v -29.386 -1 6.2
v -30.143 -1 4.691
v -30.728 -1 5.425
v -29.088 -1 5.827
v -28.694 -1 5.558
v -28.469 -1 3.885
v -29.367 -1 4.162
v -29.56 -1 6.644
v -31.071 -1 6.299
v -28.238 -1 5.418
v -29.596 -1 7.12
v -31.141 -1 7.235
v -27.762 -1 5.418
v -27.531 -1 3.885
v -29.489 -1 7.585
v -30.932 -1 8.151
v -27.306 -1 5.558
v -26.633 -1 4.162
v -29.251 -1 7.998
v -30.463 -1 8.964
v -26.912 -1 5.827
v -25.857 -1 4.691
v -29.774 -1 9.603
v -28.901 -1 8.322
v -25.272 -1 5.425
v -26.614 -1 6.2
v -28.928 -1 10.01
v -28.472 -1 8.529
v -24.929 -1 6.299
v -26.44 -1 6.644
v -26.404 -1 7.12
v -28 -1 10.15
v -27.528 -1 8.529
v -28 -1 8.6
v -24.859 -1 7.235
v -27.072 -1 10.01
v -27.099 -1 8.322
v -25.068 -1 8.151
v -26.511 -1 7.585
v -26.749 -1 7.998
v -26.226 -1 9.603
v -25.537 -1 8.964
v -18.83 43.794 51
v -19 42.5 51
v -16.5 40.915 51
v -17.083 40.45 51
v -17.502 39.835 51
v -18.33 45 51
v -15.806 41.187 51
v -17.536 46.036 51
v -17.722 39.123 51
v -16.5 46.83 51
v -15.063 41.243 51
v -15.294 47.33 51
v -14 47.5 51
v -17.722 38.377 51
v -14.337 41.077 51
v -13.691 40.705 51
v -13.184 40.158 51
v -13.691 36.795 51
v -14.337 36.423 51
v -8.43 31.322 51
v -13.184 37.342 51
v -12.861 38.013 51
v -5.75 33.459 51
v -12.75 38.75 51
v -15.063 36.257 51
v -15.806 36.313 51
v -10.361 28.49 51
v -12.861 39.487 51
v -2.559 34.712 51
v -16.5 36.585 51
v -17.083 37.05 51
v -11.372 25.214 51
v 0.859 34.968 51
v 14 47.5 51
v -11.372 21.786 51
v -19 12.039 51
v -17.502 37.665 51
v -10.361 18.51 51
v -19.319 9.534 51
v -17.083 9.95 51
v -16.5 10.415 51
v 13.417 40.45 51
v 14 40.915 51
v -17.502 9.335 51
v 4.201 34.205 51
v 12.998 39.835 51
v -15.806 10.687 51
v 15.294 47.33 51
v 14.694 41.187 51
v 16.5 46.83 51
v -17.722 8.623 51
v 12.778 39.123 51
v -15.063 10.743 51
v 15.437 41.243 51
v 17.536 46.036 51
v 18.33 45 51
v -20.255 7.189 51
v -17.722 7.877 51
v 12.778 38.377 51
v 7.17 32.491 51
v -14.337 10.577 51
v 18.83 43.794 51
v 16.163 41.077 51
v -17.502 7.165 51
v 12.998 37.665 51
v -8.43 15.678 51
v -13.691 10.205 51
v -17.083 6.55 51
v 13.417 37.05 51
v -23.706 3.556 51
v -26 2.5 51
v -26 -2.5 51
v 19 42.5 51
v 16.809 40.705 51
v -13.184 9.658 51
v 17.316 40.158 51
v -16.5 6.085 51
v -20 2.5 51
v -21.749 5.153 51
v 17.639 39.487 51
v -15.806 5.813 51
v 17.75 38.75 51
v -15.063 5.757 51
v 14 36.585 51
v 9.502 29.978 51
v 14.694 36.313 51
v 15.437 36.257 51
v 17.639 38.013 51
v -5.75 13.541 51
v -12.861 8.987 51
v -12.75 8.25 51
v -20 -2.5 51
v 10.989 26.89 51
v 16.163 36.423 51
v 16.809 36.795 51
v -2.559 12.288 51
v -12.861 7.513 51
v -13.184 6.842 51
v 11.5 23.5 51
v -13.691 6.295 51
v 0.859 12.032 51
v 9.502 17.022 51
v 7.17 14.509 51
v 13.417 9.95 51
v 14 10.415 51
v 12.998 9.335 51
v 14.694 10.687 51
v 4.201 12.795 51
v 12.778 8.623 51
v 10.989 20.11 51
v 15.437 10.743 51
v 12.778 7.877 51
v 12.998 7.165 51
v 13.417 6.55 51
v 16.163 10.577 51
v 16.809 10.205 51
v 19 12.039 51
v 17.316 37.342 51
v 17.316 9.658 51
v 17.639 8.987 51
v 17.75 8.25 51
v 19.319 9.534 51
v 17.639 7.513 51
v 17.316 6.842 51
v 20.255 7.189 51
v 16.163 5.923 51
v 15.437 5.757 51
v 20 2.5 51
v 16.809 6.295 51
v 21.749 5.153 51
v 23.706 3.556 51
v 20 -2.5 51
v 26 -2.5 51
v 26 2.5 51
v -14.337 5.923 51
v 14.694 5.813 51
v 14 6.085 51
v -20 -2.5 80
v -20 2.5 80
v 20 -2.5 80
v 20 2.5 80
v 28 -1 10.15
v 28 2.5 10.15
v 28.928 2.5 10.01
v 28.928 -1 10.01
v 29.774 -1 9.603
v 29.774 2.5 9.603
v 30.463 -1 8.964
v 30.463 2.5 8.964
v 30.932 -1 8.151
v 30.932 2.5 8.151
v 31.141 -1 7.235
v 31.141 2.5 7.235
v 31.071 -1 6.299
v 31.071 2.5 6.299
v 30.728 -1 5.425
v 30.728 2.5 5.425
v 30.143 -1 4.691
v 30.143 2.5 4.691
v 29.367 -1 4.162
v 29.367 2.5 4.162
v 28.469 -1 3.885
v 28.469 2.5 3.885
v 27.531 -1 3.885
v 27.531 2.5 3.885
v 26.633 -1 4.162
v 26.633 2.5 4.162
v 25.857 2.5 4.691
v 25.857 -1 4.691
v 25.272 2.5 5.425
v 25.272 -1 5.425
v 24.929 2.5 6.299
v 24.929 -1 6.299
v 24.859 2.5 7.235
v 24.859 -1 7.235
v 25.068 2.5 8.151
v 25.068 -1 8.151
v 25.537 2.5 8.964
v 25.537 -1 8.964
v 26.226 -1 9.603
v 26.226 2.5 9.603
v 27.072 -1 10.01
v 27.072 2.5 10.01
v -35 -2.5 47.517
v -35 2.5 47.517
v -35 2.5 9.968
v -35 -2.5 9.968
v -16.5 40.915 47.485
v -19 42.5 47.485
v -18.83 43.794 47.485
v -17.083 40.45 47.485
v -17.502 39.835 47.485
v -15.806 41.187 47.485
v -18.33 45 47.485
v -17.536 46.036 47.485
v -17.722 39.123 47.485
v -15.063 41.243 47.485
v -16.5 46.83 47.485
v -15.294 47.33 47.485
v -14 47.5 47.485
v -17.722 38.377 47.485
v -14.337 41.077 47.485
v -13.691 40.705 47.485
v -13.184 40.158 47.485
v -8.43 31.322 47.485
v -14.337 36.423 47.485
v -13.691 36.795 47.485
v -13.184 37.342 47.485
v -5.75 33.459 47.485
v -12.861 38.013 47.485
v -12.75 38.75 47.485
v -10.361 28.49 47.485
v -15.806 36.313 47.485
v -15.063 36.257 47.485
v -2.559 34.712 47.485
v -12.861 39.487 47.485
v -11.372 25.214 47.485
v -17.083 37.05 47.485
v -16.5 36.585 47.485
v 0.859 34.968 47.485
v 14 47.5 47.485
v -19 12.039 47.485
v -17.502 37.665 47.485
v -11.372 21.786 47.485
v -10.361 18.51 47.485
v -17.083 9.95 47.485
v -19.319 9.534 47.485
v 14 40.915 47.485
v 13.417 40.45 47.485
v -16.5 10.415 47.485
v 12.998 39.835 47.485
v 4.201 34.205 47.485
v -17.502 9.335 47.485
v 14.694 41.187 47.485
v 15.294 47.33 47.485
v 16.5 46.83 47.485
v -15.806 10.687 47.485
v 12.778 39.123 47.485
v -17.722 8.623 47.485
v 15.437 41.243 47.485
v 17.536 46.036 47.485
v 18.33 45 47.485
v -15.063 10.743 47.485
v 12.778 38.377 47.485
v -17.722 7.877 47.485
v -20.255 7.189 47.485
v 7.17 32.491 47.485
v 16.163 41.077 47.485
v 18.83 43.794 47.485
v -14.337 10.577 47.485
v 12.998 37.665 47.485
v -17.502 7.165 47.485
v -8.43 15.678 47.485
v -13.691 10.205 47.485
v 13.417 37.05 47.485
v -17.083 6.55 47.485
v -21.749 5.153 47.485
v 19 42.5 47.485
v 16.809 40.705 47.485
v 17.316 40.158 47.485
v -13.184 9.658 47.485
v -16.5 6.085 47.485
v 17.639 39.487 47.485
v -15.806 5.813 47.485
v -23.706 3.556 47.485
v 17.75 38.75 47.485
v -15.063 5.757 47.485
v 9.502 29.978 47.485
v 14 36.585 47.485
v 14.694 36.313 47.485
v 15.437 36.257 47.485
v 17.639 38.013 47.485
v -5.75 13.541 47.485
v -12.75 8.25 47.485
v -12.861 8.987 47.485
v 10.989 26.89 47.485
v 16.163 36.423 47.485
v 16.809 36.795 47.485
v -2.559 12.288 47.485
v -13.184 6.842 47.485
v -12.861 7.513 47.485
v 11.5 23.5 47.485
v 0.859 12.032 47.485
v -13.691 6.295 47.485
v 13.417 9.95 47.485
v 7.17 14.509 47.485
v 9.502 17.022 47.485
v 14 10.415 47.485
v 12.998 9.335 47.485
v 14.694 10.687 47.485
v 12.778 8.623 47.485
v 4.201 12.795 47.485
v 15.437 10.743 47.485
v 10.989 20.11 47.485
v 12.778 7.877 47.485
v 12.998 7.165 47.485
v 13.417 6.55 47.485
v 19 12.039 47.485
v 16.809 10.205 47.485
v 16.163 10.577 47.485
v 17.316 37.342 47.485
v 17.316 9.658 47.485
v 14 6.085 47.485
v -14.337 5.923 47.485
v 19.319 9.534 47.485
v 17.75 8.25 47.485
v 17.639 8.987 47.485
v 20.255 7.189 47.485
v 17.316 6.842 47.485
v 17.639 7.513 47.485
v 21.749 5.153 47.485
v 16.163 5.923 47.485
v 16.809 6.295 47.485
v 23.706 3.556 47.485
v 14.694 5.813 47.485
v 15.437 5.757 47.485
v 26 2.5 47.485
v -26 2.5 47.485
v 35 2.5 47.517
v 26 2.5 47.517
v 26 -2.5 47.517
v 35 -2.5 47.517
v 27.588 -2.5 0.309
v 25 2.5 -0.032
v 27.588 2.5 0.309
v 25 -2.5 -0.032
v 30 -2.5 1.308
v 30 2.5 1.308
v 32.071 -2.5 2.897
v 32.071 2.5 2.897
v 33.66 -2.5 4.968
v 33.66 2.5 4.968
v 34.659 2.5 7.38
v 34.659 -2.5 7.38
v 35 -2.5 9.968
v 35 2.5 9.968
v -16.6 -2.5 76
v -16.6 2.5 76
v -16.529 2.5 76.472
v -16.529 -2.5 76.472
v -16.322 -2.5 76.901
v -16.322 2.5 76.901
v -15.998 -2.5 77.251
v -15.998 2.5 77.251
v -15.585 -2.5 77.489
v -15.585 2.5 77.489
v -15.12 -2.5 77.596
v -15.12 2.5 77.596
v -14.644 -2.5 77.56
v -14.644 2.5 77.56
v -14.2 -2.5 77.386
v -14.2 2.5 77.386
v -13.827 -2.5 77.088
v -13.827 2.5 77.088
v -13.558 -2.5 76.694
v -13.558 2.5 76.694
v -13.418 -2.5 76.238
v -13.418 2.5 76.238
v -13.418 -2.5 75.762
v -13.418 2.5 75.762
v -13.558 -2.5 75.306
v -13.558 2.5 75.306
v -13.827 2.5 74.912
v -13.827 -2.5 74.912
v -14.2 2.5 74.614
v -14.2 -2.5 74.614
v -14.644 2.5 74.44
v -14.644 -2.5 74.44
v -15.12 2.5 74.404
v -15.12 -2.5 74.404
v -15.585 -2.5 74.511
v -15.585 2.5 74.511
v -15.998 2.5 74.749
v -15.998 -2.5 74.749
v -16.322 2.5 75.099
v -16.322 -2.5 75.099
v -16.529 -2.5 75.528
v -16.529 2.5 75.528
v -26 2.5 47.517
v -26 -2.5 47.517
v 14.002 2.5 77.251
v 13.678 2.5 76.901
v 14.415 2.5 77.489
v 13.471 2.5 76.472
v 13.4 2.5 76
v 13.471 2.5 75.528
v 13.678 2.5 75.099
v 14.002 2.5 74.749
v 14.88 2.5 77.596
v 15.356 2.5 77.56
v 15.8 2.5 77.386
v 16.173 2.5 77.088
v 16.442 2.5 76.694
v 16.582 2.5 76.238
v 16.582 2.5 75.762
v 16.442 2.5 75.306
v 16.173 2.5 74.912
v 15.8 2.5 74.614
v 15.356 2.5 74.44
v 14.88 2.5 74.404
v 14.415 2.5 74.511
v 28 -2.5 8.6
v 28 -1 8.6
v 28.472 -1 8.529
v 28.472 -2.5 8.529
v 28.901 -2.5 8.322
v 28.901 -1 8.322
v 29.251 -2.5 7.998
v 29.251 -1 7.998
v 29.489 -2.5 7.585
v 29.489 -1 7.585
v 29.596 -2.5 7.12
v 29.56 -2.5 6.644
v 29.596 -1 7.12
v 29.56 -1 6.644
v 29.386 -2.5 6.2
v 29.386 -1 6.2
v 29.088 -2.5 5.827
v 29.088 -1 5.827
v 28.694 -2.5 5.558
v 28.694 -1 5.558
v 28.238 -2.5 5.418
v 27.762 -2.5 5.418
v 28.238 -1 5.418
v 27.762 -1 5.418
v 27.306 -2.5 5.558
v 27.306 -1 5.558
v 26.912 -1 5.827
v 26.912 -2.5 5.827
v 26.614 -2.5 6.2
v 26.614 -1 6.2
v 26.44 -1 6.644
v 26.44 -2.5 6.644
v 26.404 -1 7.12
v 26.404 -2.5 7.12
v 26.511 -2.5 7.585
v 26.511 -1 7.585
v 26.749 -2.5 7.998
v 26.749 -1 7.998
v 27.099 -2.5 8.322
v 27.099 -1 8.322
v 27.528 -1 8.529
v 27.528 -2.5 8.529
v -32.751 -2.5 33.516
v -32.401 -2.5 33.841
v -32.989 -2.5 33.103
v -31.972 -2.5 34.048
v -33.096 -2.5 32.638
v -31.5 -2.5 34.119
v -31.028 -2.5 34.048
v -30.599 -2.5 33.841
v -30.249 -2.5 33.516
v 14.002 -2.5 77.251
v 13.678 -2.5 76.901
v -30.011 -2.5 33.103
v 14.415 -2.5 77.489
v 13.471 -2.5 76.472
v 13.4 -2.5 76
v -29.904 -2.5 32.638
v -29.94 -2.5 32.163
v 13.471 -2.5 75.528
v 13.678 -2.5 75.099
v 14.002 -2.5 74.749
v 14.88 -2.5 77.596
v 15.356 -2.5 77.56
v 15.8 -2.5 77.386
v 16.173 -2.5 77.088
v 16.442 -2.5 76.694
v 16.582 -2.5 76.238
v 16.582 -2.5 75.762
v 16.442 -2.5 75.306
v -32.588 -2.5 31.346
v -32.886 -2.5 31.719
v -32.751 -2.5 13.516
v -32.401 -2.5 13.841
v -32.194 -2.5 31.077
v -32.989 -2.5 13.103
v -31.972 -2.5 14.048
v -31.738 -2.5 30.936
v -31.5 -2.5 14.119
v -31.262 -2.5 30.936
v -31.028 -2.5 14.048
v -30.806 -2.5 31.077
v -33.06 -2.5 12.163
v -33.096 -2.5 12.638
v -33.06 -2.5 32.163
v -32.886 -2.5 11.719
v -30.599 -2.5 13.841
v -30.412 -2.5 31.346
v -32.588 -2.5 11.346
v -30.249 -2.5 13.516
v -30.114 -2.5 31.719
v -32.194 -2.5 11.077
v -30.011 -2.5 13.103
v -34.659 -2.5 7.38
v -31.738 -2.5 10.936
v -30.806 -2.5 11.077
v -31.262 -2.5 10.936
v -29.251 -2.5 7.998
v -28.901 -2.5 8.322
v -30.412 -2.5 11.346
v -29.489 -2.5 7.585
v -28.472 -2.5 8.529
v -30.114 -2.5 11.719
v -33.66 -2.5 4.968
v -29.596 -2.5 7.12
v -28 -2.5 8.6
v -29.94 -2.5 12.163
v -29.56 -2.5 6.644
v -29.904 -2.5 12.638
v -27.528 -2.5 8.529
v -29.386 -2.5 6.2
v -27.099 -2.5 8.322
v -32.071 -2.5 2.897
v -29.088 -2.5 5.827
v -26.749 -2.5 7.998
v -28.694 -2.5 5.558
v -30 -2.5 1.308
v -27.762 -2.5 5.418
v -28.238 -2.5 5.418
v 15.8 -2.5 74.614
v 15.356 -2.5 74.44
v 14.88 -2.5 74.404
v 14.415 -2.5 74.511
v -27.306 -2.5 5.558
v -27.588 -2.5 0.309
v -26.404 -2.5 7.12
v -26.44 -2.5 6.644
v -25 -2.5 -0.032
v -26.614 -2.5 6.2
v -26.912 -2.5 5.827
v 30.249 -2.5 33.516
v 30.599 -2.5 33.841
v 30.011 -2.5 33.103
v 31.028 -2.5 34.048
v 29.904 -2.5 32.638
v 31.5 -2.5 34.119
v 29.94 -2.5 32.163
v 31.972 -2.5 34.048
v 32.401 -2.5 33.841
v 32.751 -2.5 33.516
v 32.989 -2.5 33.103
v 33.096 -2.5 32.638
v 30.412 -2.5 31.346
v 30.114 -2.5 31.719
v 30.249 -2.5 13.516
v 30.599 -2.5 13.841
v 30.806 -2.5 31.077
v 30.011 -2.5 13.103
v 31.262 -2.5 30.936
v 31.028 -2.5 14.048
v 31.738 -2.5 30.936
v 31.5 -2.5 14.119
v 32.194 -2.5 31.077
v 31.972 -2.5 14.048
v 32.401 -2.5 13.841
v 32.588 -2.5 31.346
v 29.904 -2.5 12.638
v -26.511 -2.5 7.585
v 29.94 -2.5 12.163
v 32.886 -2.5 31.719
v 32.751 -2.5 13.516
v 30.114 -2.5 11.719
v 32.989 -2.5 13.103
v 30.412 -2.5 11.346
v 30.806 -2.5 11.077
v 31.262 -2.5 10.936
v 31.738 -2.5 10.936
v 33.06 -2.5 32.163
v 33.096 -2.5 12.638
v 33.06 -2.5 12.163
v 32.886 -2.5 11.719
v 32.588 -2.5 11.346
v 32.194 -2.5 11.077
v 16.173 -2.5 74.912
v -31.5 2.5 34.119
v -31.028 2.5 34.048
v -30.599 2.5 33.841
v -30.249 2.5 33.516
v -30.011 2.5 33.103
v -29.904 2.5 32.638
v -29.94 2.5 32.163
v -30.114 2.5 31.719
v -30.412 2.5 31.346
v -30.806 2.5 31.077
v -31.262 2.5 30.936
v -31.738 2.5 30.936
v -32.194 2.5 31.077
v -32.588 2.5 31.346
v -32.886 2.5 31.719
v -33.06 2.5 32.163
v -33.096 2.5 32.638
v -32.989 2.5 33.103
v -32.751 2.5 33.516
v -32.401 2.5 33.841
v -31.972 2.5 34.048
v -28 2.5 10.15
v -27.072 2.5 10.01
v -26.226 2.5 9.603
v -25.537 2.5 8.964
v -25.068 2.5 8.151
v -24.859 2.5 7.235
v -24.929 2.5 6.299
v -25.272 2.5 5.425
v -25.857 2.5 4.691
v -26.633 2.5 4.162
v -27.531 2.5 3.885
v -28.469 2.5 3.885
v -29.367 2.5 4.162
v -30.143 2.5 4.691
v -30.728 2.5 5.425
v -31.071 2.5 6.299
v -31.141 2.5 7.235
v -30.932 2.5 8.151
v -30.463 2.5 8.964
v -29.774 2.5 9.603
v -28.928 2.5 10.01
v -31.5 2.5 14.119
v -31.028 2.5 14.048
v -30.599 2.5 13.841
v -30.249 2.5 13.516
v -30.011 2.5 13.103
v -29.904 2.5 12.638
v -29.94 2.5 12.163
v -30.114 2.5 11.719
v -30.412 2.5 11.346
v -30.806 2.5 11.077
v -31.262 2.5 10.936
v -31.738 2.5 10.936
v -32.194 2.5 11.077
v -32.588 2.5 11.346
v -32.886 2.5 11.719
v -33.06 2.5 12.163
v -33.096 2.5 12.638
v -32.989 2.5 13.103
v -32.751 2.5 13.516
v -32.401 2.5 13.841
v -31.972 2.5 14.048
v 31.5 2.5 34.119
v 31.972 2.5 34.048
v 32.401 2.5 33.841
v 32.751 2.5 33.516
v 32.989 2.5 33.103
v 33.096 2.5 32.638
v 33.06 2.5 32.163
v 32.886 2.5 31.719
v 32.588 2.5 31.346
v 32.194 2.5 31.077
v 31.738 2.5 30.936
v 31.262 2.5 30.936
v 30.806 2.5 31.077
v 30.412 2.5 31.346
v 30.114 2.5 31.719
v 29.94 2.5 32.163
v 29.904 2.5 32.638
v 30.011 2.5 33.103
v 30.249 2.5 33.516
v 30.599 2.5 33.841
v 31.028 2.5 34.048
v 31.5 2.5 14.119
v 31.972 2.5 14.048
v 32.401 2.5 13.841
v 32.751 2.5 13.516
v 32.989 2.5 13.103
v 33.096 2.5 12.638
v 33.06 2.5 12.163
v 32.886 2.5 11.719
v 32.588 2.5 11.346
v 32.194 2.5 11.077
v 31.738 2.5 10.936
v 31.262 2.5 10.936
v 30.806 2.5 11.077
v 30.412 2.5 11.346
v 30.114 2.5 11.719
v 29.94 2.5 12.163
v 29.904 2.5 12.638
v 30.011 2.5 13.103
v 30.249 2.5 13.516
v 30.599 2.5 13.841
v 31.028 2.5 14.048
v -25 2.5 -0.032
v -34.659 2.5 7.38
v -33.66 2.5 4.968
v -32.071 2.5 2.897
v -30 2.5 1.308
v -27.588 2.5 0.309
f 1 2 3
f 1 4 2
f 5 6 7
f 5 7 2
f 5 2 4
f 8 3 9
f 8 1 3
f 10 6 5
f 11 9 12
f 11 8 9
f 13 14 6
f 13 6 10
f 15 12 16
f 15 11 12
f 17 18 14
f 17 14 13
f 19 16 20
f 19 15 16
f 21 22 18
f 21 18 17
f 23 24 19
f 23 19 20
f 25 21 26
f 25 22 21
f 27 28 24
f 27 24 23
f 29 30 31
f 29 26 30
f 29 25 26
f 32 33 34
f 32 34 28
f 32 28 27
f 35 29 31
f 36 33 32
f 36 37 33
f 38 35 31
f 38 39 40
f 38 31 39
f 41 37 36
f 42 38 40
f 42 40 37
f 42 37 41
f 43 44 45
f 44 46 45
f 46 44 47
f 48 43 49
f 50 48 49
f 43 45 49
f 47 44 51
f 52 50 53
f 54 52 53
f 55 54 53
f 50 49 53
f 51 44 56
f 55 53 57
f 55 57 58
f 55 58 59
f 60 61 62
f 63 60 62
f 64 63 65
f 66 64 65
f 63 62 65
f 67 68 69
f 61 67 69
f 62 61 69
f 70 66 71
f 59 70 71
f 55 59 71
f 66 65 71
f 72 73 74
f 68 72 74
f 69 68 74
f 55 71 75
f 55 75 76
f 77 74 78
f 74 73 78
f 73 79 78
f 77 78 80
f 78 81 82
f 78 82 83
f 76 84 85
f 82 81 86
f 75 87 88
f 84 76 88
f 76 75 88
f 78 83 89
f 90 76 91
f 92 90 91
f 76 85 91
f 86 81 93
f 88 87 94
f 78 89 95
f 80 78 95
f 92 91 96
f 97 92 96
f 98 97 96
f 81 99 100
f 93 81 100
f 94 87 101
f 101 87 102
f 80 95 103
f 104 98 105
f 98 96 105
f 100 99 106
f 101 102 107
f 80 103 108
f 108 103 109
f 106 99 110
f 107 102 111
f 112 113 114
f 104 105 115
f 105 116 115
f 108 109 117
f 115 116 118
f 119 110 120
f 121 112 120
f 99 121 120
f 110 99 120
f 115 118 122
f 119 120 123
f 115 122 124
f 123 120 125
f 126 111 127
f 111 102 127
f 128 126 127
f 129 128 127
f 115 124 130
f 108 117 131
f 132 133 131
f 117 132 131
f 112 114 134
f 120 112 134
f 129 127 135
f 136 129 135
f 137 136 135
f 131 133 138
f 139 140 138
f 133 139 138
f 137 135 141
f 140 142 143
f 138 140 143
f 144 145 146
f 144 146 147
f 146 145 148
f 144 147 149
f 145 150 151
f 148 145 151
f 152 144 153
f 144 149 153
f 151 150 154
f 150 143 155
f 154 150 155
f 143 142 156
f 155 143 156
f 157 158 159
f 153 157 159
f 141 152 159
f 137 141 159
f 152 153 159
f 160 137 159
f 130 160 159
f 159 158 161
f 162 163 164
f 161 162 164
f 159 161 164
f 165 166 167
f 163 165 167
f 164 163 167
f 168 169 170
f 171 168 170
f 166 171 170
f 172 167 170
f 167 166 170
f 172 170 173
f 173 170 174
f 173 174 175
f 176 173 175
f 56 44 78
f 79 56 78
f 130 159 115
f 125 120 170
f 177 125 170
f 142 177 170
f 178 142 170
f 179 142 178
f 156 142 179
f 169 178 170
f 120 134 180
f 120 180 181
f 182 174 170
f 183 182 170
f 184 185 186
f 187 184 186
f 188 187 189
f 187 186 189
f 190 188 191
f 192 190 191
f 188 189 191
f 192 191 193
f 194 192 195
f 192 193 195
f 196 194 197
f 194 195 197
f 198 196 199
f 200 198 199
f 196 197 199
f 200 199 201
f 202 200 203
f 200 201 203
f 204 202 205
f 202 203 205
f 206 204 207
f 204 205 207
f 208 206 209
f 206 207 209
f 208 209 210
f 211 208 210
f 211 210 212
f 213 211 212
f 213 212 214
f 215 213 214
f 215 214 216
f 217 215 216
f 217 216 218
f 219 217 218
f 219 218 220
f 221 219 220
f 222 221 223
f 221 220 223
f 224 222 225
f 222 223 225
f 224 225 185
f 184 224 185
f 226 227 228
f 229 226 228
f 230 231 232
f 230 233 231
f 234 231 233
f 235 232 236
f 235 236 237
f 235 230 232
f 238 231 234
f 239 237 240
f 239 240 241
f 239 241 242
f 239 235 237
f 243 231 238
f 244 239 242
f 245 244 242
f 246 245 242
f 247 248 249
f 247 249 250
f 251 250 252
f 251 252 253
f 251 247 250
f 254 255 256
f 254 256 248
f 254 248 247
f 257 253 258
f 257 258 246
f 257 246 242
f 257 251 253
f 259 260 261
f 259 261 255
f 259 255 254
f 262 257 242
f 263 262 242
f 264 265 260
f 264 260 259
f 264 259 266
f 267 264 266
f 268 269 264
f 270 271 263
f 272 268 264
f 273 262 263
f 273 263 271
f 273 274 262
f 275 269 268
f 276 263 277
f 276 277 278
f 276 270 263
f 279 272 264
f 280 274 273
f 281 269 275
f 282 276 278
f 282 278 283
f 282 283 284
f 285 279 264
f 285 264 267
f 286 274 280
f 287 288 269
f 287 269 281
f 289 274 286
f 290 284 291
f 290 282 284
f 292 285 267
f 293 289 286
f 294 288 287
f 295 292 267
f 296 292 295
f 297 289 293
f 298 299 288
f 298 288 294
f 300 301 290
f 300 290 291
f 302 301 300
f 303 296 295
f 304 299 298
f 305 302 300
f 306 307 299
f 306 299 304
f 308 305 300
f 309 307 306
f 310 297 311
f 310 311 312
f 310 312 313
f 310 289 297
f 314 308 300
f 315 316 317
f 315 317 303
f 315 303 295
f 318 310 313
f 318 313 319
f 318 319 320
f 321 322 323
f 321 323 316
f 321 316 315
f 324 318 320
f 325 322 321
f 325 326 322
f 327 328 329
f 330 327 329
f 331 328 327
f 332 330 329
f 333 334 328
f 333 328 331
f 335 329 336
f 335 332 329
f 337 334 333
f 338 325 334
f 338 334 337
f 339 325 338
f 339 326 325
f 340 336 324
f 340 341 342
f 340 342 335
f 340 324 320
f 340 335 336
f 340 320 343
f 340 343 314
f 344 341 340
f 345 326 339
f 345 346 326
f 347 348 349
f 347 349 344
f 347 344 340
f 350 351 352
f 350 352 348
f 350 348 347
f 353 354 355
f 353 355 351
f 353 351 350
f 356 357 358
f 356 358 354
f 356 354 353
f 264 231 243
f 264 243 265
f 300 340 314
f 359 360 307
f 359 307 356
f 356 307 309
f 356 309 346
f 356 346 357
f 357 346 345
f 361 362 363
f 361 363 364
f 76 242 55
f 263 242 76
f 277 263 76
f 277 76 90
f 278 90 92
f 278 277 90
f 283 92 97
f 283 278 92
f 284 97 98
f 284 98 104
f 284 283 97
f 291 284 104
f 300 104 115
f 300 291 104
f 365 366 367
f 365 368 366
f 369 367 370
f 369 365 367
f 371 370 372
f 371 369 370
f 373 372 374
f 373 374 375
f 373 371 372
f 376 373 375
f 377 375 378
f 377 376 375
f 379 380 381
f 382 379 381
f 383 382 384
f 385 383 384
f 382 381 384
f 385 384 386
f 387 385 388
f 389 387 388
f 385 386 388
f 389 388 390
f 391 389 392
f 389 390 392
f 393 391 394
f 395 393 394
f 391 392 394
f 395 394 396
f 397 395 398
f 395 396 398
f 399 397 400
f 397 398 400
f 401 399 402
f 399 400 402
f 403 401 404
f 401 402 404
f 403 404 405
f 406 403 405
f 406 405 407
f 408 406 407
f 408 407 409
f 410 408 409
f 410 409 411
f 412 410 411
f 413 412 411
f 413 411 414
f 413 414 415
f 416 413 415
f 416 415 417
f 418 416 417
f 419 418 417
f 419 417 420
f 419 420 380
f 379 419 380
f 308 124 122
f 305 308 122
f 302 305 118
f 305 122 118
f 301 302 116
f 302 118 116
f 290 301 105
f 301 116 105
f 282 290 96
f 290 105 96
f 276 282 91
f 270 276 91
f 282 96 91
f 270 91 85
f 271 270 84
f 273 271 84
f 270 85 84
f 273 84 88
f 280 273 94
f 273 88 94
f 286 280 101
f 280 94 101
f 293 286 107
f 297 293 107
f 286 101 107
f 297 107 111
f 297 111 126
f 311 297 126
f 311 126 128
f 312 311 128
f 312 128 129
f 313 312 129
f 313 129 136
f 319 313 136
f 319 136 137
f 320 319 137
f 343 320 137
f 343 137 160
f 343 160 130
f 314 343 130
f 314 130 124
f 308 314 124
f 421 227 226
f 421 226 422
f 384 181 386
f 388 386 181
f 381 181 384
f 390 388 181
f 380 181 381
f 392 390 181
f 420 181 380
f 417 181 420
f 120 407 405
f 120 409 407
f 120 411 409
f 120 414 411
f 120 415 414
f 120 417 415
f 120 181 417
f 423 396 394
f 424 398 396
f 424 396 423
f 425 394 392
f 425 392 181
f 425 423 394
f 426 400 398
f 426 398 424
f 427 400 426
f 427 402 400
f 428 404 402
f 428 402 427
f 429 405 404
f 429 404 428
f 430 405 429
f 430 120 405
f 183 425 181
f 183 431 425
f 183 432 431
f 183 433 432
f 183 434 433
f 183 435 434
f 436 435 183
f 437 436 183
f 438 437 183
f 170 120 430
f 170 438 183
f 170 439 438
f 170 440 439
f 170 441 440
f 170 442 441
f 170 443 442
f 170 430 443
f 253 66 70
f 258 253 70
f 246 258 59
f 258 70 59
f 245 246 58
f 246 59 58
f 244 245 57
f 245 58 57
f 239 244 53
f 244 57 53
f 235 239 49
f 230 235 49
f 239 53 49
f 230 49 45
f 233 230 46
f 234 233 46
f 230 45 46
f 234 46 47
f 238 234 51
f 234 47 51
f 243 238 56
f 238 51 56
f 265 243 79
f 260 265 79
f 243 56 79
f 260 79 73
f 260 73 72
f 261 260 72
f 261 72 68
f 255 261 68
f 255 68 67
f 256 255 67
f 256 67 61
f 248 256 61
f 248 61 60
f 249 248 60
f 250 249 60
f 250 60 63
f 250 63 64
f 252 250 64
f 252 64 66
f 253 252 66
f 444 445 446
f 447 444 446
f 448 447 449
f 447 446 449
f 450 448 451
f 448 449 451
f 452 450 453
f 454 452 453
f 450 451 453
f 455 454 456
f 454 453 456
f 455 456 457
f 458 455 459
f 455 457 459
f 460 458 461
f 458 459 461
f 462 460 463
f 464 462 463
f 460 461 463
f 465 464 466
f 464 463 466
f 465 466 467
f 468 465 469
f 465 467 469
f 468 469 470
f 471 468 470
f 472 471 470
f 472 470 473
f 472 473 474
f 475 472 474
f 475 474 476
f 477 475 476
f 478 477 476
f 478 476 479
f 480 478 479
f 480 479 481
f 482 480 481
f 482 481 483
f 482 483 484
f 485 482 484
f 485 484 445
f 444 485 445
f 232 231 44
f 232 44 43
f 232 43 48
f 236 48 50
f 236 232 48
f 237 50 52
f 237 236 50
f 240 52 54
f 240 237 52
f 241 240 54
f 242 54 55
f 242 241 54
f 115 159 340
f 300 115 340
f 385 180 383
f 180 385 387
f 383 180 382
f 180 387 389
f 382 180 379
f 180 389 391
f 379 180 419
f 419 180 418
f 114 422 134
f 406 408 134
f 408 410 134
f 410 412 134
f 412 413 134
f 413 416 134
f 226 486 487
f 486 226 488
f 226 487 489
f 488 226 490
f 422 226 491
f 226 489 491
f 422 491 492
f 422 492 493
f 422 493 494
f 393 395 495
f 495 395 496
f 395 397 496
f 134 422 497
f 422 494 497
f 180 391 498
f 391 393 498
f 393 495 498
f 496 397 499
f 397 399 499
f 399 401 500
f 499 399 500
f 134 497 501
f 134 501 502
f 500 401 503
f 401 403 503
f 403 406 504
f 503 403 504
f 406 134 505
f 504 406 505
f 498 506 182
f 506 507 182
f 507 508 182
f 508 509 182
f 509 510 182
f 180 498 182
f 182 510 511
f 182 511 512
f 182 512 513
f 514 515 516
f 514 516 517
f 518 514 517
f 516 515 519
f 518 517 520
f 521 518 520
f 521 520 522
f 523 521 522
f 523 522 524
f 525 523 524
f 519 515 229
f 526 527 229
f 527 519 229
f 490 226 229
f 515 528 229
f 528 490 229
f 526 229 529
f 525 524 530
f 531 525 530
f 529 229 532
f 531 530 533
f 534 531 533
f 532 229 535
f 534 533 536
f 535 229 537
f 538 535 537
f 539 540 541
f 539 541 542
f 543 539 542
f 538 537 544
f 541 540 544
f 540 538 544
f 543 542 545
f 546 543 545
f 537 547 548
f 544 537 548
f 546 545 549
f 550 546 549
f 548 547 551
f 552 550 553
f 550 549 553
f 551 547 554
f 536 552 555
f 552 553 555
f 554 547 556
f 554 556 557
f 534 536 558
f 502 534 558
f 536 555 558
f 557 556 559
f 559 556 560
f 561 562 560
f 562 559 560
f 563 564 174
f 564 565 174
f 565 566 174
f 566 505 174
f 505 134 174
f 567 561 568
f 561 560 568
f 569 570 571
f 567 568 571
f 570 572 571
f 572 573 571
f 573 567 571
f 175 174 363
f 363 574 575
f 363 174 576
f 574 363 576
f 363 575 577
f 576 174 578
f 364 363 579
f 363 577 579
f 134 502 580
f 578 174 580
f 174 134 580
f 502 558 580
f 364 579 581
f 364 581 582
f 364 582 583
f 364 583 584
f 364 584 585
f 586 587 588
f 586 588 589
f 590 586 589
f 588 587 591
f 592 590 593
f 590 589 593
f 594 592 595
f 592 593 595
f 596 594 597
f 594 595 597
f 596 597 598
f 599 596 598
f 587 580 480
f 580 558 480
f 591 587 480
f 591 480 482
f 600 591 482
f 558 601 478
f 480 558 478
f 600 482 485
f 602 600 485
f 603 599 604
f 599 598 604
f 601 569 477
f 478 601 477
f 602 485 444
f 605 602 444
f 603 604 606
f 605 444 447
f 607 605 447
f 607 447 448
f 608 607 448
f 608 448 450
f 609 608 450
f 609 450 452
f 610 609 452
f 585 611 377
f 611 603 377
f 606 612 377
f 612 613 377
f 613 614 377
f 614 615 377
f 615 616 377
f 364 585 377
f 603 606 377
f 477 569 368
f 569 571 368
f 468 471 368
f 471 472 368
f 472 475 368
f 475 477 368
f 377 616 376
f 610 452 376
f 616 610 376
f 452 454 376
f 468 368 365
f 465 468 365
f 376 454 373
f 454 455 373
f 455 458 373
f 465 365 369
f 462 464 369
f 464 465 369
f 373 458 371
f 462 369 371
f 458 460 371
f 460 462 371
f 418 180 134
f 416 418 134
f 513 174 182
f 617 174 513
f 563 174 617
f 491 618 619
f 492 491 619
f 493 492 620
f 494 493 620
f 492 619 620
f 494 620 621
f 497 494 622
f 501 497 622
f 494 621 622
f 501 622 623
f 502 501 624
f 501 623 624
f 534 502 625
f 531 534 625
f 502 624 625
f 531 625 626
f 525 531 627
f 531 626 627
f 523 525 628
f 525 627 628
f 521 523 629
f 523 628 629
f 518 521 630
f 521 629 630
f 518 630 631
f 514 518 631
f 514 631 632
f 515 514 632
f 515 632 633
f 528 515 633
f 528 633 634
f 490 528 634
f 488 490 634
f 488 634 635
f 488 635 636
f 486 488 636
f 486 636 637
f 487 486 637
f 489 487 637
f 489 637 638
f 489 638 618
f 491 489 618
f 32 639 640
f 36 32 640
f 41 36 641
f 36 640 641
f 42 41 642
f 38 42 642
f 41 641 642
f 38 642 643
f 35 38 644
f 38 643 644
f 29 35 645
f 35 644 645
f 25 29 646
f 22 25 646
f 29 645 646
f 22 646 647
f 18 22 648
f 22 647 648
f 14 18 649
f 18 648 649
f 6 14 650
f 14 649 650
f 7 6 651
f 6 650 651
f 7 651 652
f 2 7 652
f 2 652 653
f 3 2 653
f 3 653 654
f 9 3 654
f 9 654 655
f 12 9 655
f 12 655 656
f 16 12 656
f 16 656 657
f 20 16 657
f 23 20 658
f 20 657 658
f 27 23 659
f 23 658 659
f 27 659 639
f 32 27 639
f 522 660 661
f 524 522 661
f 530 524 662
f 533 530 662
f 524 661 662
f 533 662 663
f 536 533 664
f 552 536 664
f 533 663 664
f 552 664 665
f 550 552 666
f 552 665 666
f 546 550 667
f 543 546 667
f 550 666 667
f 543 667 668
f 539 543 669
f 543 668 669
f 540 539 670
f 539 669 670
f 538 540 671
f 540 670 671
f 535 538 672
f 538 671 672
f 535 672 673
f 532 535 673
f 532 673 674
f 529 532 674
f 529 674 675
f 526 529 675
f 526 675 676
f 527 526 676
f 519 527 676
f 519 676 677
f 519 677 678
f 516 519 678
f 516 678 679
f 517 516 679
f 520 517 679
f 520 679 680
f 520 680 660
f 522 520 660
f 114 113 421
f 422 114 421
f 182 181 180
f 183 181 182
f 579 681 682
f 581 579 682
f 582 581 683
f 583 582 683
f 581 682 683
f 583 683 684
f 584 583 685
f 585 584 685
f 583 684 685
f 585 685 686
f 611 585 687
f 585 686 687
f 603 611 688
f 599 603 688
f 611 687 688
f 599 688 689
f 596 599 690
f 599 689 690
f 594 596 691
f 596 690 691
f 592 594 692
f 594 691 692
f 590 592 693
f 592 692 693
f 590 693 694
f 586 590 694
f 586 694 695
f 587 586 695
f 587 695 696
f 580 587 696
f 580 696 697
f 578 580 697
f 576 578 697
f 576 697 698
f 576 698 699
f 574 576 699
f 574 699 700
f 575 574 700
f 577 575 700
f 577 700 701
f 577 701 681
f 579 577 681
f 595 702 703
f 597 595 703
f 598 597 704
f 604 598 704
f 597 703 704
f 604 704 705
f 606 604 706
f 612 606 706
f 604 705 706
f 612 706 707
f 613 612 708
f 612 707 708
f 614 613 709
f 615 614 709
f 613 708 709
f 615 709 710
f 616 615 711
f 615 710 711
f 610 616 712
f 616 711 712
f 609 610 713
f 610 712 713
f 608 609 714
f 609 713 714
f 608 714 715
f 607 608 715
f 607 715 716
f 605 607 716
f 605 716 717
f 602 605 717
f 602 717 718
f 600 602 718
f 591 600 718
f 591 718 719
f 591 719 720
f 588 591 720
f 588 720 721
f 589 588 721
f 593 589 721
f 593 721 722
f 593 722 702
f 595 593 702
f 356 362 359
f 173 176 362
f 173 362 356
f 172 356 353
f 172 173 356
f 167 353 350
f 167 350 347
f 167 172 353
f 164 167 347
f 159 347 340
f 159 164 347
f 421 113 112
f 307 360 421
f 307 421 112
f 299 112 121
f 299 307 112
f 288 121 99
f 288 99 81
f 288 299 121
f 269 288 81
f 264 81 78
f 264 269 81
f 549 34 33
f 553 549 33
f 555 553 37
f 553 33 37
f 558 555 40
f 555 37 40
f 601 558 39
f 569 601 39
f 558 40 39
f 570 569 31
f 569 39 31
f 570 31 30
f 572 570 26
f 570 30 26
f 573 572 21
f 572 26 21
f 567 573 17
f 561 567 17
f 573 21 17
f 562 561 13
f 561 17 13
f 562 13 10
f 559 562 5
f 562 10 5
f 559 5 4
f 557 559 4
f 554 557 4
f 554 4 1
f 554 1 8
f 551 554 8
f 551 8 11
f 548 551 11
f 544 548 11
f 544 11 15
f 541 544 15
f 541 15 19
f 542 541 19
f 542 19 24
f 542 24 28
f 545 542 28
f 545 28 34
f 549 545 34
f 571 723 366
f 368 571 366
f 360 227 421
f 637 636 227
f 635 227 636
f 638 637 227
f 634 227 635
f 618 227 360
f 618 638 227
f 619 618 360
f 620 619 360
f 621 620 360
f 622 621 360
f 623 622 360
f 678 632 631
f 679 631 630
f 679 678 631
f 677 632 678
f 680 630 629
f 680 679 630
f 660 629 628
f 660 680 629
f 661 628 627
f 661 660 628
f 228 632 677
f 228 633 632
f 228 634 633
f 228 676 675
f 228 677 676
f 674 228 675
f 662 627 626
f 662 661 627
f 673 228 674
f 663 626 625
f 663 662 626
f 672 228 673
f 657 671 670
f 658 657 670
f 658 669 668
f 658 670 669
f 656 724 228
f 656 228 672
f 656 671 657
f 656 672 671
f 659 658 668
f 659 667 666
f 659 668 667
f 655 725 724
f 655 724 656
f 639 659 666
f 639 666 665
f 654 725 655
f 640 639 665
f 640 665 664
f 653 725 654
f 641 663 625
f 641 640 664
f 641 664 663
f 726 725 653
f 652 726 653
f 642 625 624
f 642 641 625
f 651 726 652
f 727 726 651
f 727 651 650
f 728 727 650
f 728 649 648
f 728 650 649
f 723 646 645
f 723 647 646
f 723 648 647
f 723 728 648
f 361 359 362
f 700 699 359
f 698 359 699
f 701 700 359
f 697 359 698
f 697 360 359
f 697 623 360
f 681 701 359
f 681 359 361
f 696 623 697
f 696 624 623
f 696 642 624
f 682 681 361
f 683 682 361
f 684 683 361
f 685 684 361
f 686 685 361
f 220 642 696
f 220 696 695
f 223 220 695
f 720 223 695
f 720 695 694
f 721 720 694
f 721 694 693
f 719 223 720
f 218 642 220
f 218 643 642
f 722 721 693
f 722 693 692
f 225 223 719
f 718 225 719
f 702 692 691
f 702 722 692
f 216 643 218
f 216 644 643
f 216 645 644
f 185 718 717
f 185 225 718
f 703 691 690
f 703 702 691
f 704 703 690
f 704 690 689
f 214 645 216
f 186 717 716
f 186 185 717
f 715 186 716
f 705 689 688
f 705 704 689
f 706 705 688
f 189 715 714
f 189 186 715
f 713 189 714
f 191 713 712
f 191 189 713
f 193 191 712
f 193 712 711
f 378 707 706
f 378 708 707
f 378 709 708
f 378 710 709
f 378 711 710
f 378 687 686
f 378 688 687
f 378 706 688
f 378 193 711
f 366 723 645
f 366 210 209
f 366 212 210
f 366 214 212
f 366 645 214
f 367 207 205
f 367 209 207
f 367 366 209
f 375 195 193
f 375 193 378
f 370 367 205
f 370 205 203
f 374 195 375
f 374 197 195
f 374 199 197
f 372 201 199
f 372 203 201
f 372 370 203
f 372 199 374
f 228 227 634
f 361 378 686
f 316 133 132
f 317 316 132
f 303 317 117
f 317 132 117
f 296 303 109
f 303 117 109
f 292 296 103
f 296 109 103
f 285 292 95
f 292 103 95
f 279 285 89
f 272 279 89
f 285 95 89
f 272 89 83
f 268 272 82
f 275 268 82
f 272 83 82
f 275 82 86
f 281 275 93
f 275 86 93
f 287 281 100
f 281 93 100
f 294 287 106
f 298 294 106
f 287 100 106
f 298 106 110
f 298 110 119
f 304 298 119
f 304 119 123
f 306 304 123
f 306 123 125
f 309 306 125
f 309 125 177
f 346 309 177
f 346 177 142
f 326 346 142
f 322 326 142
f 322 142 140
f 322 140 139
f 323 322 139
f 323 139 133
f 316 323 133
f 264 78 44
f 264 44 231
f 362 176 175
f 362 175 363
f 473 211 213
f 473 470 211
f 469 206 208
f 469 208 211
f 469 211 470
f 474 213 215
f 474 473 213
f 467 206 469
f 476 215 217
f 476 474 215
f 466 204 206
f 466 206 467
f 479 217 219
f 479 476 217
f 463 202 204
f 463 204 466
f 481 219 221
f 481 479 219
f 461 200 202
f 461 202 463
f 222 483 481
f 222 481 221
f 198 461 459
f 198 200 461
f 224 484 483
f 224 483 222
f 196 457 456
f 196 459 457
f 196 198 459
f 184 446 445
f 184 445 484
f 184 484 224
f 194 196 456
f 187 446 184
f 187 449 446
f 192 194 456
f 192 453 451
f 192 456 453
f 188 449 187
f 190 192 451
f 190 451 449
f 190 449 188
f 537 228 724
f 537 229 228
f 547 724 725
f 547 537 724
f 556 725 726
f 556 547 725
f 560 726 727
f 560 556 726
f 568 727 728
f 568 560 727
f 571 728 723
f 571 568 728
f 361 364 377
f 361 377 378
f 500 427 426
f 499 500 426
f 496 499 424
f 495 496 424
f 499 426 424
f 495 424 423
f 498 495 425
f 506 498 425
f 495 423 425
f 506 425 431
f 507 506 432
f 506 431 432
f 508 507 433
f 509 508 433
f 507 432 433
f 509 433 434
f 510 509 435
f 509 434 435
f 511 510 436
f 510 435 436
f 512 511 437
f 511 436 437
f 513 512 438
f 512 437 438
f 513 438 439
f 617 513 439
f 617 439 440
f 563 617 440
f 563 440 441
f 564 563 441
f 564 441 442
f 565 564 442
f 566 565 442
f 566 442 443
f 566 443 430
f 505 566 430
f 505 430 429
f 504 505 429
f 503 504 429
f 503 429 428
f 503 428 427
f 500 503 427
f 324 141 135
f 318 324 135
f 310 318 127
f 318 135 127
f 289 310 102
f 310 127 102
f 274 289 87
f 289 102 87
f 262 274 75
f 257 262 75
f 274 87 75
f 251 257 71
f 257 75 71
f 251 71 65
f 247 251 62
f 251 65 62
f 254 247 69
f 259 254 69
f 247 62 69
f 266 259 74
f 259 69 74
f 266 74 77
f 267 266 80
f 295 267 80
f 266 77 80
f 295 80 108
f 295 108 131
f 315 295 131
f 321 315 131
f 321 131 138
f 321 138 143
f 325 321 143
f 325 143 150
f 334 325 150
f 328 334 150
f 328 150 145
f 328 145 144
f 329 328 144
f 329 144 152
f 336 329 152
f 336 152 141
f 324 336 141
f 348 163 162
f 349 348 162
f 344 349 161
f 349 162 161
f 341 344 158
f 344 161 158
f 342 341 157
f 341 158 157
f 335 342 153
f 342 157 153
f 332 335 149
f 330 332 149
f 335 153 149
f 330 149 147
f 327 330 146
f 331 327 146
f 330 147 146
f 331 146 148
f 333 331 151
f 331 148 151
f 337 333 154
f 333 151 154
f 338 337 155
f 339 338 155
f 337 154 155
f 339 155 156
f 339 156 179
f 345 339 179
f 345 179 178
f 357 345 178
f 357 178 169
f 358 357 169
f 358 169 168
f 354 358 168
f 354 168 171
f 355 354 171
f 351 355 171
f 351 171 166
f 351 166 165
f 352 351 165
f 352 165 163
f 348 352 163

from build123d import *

# Parameters (mm, degrees)
SKETCH_1_W           = 70
SKETCH_1_H           = 5
EXTRUDE_1_DEPTH      = 8
SKETCH_3_W           = 38
SKETCH_3_H           = 5
EXTRUDE_2_DEPTH      = 43
SKETCH_4_W           = 38
SKETCH_4_H           = 5
EXTRUDE_3_DEPTH      = 45
SKETCH_5_R           = 11.5
SKETCH_5_R_2         = 1.6
CUT_EXTRUDE_2_DEPTH  = 45
FILLET_1_R           = 5
CUT_EXTRUDE_3_REACH  = 81.536
SKETCH_6_W           = 42
SKETCH_6_H           = 1.562526182
EXTRUDE_4_DEPTH      = 7
EXTRUDE_4_DEPTH_BACK = 45
SKETCH_7_W           = 13.004753842
SKETCH_7_H           = 5
FILLET_2_R           = 10
SKETCH_13_W          = 70
SKETCH_13_H          = 47.548344346
EXTRUDE_6_DEPTH      = 5
SKETCH_10_R          = 2.5
CUT_EXTRUDE_6_DEPTH  = 10
SKETCH_11_W          = 40
SKETCH_11_H          = 5
EXTRUDE_5_DEPTH      = 29
SKETCH_12_R          = 1.6
CUT_EXTRUDE_7_DEPTH  = 7
SKETCH_14_R          = 1.6
CUT_EXTRUDE_8_DEPTH  = 7
SKETCH_15_R          = 3.15
CUT_EXTRUDE_9_DEPTH  = 3.5
FILLET_3_R           = 10
SKETCH_16_R          = 1.6
CUT_EXTRUDE_10_DEPTH = 10


with BuildPart() as part:
    # 草图1 → 凸台-拉伸1 (new body)
    with BuildSketch(Plane.XY):
        Rectangle(SKETCH_1_W, SKETCH_1_H)
    extrude(amount=EXTRUDE_1_DEPTH)

    # 草图3 → 凸台-拉伸2 (add)
    with BuildSketch(Plane.XY.offset(8)):
        Rectangle(SKETCH_3_W, SKETCH_3_H)
    extrude(amount=EXTRUDE_2_DEPTH)

    # 草图4 → 凸台-拉伸3 (add)
    with BuildSketch(Plane(origin=(0, 2.5, 0), x_dir=(1, 0, 0), z_dir=(0, 1, 0))):
        with Locations((0, -48.5)):
            Rectangle(SKETCH_4_W, SKETCH_4_H)
    extrude(amount=EXTRUDE_3_DEPTH)

    # 草图5 → 切除-拉伸2 (cut)
    with BuildSketch(Plane.XY.offset(51)):
        with Locations((0, 23.5)):
            Circle(SKETCH_5_R)
        with Locations((-15.25, 38.75)):
            Circle(SKETCH_5_R_2)
        with Locations((15.25, 38.75)):
            Circle(SKETCH_5_R_2)
        with Locations((-15.25, 8.25)):
            Circle(SKETCH_5_R_2)
        with Locations((15.25, 8.25)):
            Circle(SKETCH_5_R_2)
    extrude(amount=-CUT_EXTRUDE_2_DEPTH, mode=Mode.SUBTRACT)

    # 圆角1
    fillet_1_edges = [part.edges().sort_by_distance(p)[0] for p in [
        (-19, 47.5, 48.5),
        (19, 47.5, 48.5),
    ]]
    fillet(fillet_1_edges, radius=FILLET_1_R)

    # 切除-拉伸3: up to this face of the body (flat: up to its plane)
    cut_extrude_3_end = Plane(part.part.faces().sort_by_distance((0, 2.5, 20.572854291))[0])
    # 草图6 → 切除-拉伸3 (cut, up to the picked face)
    with BuildSketch(Plane(origin=(0, 47.5, 0), x_dir=(1, 0, 0), z_dir=(0, 1, 0)), mode=Mode.PRIVATE) as cut_extrude_3_sk1:
        with Locations((0, -46.703490751)):
            Rectangle(SKETCH_6_W, SKETCH_6_H)
    cut_extrude_3_tool1 = split(extrude(cut_extrude_3_sk1.sketch, amount=-CUT_EXTRUDE_3_REACH, mode=Mode.PRIVATE), bisect_by=cut_extrude_3_end, keep=Keep.BOTH, mode=Mode.PRIVATE)
    add(cut_extrude_3_tool1.solids().sort_by(Axis((0, 47.5, 46.703491), (0, -1, 0)))[0], mode=Mode.SUBTRACT)

    # 草图7 → 凸台-拉伸4 (add, two sides: drawn at the far end of the back side and taken through both)
    with BuildSketch(Plane(origin=(19, 0, 0), x_dir=(0, 0, -1), z_dir=(1, 0, 0)).offset(-EXTRUDE_4_DEPTH_BACK)):
        with Locations((-44.497623079, 0)):
            Rectangle(SKETCH_7_W, SKETCH_7_H)
    extrude(amount=EXTRUDE_4_DEPTH + EXTRUDE_4_DEPTH_BACK)

    # 圆角2
    # the kernel refuses this fillet: 10 mm, written as the material it adds along each edge
    with BuildSketch(Plane(origin=(-19, 2.5, 47.484753842), x_dir=(-1, 0, 0), z_dir=(0, 0, 1)), Plane(origin=(19, 2.5, 51), x_dir=(1, 0, 0), z_dir=(0, 0, -1))) as fillet_2_piece_1:
        with BuildLine():
            CenterArc((10, -9.539392014), FILLET_2_R, 107.457603124, 72.542396876)
            Line((0, -9.539392014), (-0.2, -9.539392014))
            Line((-0.2, -9.539392014), (-0.2, 0))
            Line((-0.2, 0), (0, 0.2))
            ThreePointArc((0, 0.2), (3.5, 0.2), (6.94, 0.19078784))
            Line((6.94, 0.19078784), (7, 0))
        make_face()
    extrude(amount=3.515246158)

    # 草图13 → 凸台-拉伸6 (add)
    with BuildSketch(Plane(origin=(0, 2.5, 0), x_dir=(1, 0, 0), z_dir=(0, 1, 0))):
        with Locations((0, -23.742376921)):
            Rectangle(SKETCH_13_W, SKETCH_13_H)
    extrude(amount=-EXTRUDE_6_DEPTH)

    # 草图10 → 切除-拉伸6 (cut)
    with BuildSketch(Plane.XY.offset(51)):
        with Locations((-15.25, 38.75)):
            Circle(SKETCH_10_R)
        with Locations((15.25, 38.75)):
            Circle(SKETCH_10_R)
        with Locations((15.25, 8.25)):
            Circle(SKETCH_10_R)
        with Locations((-15.25, 8.25)):
            Circle(SKETCH_10_R)
    extrude(amount=-CUT_EXTRUDE_6_DEPTH, mode=Mode.SUBTRACT)

    # 草图11 → 凸台-拉伸5 (add)
    with BuildSketch(Plane.XY.offset(51)):
        Rectangle(SKETCH_11_W, SKETCH_11_H)
    extrude(amount=EXTRUDE_5_DEPTH)

    # 草图12 → 切除-拉伸7 (cut)
    with BuildSketch(Plane(origin=(0, 2.5, 0), x_dir=(1, 0, 0), z_dir=(0, 1, 0))):
        with Locations(Location((15, -76, 0), (0, 0, 180))):
            Circle(SKETCH_12_R)
        with Locations(Location((-15, -76, 0), (0, 0, 180))):
            Circle(SKETCH_12_R)
    extrude(amount=-CUT_EXTRUDE_7_DEPTH, mode=Mode.SUBTRACT)

    # 草图14 → 切除-拉伸8 (cut)
    with BuildSketch(Plane(origin=(0, 2.5, 0), x_dir=(1, 0, 0), z_dir=(0, 1, 0))):
        with Locations(Location((28, -7, 0), (0, 0, 270))):
            Circle(SKETCH_14_R)
        with Locations(Location((-28, -7, 0), (0, 0, 270))):
            Circle(SKETCH_14_R)
    extrude(amount=-CUT_EXTRUDE_8_DEPTH, mode=Mode.SUBTRACT)

    # 草图15 → 切除-拉伸9 (cut)
    with BuildSketch(Plane(origin=(0, 2.5, 0), x_dir=(1, 0, 0), z_dir=(0, 1, 0))):
        with Locations(Location((28, -7, 0), (0, 0, 270))):
            Circle(SKETCH_15_R)
        with Locations(Location((-28, -7, 0), (0, 0, 270))):
            Circle(SKETCH_15_R)
    extrude(amount=-CUT_EXTRUDE_9_DEPTH, mode=Mode.SUBTRACT)

    # 圆角3
    fillet_3_edges = [part.edges().sort_by_distance(p)[0] for p in [
        (35, 0, -0.031795252),
        (-35, 0, -0.031795252),
    ]]
    fillet(fillet_3_edges, radius=FILLET_3_R)

    # 草图16 → 切除-拉伸10 (cut)
    with BuildSketch(Plane(origin=(0, 2.5, 0), x_dir=(1, 0, 0), z_dir=(0, 1, 0))):
        with Locations(Location((31.5, -32.518590997, 0), (0, 0, 270))):
            Circle(SKETCH_16_R)
        with Locations(Location((31.5, -12.518590997, 0), (0, 0, 270))):
            Circle(SKETCH_16_R)
        with Locations(Location((-31.5, -32.518590997, 0), (0, 0, 270))):
            Circle(SKETCH_16_R)
        with Locations(Location((-31.5, -12.518590997, 0), (0, 0, 270))):
            Circle(SKETCH_16_R)
    extrude(amount=-CUT_EXTRUDE_10_DEPTH, mode=Mode.SUBTRACT)


solid = part.part
